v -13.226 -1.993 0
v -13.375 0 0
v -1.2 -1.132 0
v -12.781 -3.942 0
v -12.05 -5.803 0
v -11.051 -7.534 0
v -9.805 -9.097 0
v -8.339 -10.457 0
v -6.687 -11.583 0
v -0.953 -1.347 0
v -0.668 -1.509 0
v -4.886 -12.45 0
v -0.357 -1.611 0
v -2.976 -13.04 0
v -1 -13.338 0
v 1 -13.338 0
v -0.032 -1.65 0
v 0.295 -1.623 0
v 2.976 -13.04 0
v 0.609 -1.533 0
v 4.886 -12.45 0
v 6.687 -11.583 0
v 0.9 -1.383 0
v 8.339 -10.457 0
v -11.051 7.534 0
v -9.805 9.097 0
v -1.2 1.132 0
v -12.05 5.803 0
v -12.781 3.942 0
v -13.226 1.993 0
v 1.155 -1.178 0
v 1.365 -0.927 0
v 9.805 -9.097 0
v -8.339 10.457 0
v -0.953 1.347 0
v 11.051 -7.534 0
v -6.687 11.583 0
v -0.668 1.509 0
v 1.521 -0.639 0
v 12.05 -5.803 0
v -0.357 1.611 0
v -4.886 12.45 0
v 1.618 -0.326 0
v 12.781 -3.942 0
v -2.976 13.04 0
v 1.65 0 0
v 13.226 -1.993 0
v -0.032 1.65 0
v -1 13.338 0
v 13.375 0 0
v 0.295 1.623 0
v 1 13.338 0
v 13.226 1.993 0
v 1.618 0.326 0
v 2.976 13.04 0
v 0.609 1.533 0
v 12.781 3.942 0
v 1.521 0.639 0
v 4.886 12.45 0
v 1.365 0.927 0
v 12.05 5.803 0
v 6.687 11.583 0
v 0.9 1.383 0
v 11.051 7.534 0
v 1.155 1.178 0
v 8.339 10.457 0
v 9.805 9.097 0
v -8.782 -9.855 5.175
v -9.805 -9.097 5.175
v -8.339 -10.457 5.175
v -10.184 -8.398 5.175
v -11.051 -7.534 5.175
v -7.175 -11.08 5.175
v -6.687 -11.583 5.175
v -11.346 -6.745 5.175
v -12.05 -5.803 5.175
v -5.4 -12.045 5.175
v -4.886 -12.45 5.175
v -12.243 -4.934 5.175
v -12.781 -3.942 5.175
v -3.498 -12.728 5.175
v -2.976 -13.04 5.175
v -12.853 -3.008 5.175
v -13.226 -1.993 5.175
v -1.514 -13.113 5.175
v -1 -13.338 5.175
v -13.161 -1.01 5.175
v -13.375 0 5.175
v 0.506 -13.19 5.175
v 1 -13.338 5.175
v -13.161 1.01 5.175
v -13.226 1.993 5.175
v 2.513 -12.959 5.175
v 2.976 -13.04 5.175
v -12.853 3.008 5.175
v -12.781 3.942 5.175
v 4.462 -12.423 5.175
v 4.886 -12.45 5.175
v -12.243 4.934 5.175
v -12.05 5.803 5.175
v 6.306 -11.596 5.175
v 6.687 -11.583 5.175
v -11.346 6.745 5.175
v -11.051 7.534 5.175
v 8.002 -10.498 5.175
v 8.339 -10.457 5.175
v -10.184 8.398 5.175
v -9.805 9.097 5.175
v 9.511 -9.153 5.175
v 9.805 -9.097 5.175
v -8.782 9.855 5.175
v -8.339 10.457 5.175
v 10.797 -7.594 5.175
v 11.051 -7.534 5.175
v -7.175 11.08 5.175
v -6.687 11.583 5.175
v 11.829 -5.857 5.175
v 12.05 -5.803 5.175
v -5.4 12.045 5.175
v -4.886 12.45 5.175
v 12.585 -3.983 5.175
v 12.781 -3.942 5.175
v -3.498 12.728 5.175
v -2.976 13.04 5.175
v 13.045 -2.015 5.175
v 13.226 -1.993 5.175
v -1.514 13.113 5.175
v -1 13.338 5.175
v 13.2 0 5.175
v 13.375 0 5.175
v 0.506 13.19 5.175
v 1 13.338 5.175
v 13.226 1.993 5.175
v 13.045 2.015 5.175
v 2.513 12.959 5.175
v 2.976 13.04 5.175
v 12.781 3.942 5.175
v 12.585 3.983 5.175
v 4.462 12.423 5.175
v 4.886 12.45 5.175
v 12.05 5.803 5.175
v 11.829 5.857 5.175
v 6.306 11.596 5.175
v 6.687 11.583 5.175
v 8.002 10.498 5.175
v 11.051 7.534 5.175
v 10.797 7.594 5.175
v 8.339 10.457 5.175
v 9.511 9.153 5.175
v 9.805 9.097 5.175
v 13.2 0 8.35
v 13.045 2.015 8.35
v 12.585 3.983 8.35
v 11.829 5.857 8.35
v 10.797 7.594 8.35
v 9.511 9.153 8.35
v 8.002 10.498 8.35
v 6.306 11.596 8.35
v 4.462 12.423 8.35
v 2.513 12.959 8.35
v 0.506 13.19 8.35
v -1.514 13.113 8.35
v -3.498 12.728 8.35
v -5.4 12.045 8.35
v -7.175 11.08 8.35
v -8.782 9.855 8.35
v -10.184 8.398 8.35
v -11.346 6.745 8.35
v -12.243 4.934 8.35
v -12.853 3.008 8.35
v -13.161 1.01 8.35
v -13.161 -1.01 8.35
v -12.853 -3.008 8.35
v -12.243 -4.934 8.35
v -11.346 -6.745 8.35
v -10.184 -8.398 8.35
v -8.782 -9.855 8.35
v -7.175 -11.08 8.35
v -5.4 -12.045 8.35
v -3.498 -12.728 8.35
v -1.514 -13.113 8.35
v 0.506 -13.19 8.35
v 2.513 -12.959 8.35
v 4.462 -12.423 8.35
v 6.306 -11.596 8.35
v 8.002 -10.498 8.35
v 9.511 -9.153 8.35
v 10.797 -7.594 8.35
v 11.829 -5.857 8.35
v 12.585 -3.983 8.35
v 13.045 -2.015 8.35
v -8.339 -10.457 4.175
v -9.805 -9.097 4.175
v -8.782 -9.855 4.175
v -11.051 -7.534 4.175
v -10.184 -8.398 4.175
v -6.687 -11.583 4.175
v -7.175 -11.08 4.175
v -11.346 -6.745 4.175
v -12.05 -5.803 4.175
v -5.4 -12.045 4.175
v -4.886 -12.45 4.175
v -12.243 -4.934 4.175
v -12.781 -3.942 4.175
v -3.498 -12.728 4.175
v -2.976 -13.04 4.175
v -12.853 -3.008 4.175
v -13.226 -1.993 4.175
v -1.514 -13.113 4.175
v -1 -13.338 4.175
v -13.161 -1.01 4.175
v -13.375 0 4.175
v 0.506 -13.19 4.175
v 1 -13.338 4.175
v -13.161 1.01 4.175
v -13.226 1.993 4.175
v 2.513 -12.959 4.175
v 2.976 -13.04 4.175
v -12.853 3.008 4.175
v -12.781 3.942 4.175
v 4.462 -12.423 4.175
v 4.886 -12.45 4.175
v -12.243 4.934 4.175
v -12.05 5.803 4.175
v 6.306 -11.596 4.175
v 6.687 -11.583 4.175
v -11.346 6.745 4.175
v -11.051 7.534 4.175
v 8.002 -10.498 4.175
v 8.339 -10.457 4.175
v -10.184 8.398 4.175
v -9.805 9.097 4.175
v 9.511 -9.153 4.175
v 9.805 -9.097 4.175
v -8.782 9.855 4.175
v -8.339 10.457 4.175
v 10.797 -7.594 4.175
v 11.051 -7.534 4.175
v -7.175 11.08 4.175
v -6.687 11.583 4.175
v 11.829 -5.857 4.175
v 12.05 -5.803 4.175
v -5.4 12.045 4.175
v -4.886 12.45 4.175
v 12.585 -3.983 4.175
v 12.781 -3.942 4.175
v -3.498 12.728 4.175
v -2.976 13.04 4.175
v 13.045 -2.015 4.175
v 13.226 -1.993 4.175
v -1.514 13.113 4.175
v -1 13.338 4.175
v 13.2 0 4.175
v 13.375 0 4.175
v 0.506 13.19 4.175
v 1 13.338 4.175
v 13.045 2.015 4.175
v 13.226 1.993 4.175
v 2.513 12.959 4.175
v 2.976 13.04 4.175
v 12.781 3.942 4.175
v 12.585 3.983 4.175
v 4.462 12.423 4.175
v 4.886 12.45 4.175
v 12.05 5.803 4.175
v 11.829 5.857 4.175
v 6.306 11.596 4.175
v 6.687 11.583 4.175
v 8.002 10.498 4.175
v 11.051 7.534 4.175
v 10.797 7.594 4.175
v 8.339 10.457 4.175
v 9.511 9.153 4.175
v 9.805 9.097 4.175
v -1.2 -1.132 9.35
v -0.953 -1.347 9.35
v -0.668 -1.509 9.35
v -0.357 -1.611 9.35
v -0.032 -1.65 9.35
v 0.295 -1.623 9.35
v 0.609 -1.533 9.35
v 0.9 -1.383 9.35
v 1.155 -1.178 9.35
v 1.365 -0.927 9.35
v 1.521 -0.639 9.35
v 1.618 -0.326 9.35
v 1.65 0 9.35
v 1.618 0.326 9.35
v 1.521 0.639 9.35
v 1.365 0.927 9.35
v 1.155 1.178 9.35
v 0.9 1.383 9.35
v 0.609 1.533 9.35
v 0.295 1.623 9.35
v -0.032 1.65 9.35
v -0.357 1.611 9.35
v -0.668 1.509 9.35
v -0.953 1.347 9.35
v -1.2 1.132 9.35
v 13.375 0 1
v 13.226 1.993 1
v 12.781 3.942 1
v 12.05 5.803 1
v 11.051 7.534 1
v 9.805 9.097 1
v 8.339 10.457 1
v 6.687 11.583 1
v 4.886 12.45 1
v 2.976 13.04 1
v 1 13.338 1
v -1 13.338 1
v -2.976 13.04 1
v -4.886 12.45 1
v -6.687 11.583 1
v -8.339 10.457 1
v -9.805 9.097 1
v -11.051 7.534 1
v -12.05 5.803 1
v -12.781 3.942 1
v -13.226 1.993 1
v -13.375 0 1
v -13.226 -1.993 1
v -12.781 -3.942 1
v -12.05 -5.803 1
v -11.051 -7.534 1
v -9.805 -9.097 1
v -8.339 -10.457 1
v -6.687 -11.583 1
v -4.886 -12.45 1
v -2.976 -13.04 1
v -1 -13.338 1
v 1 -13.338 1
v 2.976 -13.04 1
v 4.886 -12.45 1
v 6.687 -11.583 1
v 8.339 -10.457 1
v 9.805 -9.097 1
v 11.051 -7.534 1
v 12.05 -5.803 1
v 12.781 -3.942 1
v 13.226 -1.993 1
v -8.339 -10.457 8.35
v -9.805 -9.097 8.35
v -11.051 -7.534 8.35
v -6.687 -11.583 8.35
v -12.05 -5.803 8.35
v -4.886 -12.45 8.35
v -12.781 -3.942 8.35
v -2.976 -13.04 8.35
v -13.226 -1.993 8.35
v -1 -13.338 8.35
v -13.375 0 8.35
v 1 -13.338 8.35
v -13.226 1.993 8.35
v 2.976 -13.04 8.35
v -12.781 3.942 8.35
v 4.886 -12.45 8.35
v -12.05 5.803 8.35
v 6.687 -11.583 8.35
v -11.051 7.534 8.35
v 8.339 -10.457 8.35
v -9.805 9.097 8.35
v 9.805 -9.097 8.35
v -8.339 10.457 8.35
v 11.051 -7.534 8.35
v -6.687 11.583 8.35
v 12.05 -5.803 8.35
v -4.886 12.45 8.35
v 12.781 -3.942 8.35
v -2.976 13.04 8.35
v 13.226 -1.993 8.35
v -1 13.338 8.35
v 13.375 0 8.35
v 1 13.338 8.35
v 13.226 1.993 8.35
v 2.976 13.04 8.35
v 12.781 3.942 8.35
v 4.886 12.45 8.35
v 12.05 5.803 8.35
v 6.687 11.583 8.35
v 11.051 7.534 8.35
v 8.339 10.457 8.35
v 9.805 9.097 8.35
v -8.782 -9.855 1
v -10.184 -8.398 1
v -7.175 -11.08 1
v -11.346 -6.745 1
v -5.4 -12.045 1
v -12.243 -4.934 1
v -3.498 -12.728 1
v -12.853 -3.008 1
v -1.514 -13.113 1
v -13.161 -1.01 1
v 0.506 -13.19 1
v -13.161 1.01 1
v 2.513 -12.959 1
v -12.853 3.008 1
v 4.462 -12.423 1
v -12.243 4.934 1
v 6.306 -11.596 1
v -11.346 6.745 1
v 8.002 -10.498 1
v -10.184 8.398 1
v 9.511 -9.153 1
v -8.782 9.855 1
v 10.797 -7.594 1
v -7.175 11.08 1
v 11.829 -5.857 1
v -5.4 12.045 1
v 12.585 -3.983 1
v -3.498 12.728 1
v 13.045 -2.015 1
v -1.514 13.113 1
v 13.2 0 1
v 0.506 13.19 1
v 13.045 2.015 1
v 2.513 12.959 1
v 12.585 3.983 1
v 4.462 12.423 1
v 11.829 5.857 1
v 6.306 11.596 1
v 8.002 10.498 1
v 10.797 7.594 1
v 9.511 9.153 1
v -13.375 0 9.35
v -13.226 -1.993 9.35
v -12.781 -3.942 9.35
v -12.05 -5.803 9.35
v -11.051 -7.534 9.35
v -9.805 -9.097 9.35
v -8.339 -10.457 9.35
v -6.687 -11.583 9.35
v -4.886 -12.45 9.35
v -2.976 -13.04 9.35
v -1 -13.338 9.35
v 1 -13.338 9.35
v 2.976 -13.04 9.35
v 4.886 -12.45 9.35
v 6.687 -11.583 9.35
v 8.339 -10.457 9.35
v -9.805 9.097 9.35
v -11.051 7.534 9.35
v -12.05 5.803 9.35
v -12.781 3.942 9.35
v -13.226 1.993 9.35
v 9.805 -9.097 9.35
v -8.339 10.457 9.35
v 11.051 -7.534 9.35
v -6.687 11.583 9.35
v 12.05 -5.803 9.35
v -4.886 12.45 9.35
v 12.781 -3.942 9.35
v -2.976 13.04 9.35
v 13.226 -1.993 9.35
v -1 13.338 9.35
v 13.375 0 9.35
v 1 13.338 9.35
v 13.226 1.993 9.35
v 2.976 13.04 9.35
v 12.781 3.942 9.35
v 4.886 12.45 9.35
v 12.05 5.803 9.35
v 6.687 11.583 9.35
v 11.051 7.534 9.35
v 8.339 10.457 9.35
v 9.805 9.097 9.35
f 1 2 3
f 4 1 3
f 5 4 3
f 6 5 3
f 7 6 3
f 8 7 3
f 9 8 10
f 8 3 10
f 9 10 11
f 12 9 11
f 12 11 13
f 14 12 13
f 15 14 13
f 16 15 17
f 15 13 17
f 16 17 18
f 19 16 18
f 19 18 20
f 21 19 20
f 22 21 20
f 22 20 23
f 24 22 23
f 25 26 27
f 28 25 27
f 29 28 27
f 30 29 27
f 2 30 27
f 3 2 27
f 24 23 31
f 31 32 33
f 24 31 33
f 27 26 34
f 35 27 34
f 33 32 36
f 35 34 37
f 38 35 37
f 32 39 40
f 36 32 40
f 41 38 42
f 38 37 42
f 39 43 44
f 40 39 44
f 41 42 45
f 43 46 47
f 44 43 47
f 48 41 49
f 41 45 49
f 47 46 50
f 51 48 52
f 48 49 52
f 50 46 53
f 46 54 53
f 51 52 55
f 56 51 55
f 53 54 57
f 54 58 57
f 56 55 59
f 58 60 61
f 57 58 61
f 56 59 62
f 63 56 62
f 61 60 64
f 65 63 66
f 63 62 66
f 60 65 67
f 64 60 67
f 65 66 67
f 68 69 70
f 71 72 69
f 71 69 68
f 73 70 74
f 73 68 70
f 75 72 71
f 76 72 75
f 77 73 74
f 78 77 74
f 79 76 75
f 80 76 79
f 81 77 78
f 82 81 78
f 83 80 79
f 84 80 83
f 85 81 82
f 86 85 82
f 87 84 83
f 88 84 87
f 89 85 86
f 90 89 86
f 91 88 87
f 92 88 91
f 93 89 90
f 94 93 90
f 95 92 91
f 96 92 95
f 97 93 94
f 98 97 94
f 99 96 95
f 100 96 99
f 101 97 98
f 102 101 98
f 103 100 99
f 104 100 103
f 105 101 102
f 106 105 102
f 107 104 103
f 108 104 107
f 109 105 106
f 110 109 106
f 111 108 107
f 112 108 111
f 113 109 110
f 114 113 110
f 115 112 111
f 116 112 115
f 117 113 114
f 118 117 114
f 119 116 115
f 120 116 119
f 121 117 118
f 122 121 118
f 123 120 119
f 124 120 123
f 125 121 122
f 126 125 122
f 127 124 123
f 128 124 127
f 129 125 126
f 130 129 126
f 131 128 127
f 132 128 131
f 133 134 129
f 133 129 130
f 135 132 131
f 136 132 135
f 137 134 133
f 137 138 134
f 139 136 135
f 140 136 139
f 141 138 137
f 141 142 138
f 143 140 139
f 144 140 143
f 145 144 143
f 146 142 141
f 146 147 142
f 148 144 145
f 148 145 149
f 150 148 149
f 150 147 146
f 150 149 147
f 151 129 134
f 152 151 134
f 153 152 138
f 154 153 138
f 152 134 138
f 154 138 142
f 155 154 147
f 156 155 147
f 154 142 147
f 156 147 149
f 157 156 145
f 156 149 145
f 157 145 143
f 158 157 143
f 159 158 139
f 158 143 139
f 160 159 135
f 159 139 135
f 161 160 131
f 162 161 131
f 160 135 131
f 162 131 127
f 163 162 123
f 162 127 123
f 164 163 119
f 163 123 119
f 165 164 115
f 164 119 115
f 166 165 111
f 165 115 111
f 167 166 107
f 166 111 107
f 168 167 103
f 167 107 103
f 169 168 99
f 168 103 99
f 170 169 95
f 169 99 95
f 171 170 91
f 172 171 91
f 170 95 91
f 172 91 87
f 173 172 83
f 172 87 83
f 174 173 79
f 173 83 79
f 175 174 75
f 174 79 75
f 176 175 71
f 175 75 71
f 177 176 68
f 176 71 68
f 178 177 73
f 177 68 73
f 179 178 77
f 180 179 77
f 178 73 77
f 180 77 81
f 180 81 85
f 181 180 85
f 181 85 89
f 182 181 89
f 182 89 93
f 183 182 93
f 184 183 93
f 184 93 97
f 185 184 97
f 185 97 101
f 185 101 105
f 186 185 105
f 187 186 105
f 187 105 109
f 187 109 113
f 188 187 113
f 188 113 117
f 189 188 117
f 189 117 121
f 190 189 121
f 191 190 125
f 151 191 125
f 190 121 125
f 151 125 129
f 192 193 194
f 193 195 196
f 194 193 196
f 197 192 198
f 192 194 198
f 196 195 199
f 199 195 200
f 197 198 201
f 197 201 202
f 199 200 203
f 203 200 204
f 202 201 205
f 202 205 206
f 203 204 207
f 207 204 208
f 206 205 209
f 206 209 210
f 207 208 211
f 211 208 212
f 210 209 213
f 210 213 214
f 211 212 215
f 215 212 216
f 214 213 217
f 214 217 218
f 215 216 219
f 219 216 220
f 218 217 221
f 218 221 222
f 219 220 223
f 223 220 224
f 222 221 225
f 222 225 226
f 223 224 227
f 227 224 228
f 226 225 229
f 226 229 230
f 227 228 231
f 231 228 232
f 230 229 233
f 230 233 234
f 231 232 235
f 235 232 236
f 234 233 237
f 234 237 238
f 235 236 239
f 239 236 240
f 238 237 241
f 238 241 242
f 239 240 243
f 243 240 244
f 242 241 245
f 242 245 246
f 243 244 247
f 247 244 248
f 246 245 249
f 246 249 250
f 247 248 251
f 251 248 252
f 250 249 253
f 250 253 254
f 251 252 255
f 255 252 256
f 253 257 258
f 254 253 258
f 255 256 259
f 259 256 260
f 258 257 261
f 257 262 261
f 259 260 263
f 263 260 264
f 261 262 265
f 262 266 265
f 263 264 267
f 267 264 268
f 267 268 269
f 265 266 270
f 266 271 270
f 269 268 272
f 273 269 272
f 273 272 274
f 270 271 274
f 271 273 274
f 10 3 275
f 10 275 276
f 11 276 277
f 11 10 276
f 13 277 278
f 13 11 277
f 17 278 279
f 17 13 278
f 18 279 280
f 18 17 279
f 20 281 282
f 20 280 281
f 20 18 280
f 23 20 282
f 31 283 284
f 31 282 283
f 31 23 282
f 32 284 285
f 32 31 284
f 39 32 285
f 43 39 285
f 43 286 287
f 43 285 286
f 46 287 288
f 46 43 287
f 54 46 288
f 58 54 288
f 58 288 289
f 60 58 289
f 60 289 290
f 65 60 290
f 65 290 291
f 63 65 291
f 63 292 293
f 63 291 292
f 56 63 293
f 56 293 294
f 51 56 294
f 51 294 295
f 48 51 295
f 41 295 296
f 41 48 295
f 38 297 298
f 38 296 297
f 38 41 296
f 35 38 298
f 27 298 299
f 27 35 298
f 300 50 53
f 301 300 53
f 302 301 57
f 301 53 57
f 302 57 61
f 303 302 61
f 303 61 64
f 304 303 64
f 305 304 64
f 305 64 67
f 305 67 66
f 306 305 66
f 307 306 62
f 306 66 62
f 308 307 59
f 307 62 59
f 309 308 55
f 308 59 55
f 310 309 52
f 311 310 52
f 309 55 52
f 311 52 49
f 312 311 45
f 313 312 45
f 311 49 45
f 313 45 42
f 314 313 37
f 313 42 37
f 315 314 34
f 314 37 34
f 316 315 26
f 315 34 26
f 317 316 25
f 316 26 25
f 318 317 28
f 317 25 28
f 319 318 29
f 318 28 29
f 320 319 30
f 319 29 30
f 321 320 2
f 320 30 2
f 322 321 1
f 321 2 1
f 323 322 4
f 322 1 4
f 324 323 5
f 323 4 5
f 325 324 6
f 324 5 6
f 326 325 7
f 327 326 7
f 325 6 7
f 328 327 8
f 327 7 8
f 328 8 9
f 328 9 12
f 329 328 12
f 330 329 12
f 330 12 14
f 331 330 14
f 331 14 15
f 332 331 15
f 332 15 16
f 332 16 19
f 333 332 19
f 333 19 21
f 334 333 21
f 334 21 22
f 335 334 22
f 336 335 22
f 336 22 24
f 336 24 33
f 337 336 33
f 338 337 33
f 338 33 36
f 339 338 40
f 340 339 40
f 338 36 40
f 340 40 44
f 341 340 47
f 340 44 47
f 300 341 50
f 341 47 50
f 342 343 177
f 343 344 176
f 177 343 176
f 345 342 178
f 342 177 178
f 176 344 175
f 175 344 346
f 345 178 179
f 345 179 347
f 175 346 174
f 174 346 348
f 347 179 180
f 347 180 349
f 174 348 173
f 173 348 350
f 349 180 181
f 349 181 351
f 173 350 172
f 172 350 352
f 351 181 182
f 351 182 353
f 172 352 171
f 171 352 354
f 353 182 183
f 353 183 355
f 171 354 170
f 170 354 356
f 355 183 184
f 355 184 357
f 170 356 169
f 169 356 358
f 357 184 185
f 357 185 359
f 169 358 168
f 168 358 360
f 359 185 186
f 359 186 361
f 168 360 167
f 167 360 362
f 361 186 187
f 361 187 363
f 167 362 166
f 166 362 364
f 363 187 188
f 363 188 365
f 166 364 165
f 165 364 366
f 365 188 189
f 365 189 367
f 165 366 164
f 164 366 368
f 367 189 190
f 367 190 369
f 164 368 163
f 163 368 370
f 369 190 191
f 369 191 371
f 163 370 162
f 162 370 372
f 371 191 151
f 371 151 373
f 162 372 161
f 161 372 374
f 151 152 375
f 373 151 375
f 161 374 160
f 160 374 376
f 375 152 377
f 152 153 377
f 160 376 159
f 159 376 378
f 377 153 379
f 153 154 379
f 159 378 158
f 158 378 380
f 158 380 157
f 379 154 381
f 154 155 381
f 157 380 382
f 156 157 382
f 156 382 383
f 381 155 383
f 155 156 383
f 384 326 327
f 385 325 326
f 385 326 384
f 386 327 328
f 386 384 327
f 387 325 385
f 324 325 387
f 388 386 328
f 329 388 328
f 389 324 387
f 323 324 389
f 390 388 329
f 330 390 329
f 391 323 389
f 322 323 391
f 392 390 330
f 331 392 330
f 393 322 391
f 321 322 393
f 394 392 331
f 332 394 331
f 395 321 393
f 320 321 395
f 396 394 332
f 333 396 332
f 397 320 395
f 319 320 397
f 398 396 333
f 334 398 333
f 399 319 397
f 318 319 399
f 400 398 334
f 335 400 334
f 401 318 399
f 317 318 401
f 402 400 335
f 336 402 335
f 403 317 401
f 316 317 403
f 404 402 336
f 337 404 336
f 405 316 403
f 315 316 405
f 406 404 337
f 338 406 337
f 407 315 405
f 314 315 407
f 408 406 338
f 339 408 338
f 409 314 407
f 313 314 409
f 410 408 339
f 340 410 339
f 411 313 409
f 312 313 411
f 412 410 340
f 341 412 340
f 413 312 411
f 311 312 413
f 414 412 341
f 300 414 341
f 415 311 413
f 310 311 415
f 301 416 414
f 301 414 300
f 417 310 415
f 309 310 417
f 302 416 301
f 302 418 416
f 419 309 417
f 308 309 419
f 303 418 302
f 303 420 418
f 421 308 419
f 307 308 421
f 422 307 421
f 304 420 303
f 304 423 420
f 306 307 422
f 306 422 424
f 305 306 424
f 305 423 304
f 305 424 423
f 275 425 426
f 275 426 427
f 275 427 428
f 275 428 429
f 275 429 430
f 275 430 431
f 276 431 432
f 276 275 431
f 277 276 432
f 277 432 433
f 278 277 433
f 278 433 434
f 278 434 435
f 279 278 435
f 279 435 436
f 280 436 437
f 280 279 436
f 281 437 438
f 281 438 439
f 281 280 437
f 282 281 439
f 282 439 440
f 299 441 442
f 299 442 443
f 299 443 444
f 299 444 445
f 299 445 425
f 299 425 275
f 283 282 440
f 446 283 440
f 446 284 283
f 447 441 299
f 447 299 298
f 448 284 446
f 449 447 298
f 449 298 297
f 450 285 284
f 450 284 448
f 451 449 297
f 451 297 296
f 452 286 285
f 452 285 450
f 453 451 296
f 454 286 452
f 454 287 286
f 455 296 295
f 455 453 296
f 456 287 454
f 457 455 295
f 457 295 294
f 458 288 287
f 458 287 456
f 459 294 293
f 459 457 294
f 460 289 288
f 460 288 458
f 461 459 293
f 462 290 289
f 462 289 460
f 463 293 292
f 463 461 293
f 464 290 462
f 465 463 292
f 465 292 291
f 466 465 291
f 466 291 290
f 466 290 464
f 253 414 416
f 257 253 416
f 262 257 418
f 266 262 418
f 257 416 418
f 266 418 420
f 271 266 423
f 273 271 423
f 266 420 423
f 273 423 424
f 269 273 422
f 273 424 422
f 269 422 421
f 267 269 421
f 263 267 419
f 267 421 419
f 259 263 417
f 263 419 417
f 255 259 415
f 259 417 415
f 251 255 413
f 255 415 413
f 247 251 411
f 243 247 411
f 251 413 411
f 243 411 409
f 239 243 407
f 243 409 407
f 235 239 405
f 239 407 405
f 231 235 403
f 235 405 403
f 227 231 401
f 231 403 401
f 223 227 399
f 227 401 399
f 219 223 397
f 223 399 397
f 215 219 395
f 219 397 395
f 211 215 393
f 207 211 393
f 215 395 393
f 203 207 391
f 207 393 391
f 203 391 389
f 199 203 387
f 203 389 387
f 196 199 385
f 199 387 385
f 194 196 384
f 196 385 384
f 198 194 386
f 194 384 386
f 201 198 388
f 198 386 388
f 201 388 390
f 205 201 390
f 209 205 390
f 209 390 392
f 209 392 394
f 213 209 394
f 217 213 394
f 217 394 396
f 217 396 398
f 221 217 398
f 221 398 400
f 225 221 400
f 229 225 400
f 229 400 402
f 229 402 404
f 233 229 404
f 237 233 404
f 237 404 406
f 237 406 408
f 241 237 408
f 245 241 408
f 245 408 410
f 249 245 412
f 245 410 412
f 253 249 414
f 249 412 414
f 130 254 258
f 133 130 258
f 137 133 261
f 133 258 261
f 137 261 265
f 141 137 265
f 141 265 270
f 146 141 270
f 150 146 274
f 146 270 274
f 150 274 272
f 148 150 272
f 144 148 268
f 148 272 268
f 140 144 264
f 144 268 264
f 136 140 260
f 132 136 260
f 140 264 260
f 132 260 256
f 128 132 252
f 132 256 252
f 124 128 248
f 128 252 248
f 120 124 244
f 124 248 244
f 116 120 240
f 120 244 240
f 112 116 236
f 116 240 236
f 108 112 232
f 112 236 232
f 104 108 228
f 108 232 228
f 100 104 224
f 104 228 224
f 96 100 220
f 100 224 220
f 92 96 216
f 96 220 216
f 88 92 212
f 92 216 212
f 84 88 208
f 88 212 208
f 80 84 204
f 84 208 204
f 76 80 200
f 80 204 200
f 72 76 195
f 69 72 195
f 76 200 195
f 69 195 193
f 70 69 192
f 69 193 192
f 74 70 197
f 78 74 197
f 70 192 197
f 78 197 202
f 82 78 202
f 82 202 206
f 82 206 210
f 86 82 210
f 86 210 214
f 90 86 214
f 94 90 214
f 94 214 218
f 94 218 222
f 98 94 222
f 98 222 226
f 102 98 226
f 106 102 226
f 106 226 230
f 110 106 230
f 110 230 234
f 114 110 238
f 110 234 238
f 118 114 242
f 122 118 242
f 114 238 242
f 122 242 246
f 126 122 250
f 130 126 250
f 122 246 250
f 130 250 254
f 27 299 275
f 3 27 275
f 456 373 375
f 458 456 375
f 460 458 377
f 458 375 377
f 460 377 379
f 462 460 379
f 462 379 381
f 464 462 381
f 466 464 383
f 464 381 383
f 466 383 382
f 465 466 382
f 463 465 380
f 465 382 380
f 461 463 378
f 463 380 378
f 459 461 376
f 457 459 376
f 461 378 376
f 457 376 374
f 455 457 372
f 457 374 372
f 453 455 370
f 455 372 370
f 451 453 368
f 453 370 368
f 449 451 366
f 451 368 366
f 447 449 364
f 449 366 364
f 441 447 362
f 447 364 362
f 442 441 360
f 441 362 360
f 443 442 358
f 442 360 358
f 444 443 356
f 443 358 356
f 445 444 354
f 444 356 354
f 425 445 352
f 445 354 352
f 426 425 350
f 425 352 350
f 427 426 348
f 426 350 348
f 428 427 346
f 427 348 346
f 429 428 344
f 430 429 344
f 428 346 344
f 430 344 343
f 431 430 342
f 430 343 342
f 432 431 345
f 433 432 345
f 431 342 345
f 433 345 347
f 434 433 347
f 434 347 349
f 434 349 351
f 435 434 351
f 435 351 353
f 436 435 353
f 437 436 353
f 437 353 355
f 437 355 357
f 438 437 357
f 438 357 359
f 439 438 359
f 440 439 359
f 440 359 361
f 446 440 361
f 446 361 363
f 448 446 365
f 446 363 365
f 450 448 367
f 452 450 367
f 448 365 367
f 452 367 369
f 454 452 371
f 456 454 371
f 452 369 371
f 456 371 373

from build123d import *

# Parameters (mm, degrees)
SKETCH2_R           = 13.375
BOSS_EXTRUDE1_DEPTH = 1
SKETCH3_R           = 13.2
BOSS_EXTRUDE2_DEPTH = 3.175
SKETCH4_R           = 13.375
BOSS_EXTRUDE3_DEPTH = 1
SKETCH5_R           = 13.2
BOSS_EXTRUDE4_DEPTH = 3.175
SKETCH6_R           = 13.375
BOSS_EXTRUDE5_DEPTH = 1
CUT_EXTRUDE2_DEPTH  = 10.35


with BuildPart() as part:
    # Sketch2 → Boss-Extrude1 (new body)
    with BuildSketch(Plane.XY):
        Circle(SKETCH2_R)
    extrude(amount=BOSS_EXTRUDE1_DEPTH)

    # Sketch3 → Boss-Extrude2 (add)
    with BuildSketch(Plane.XY.offset(1)):
        Circle(SKETCH3_R)
    extrude(amount=BOSS_EXTRUDE2_DEPTH)

    # Sketch4 → Boss-Extrude3 (add)
    with BuildSketch(Plane.XY.offset(4.175)):
        Circle(SKETCH4_R)
    extrude(amount=BOSS_EXTRUDE3_DEPTH)

    # Sketch5 → Boss-Extrude4 (add)
    with BuildSketch(Plane.XY.offset(5.175)):
        Circle(SKETCH5_R)
    extrude(amount=BOSS_EXTRUDE4_DEPTH)

    # Sketch6 → Boss-Extrude5 (add)
    with BuildSketch(Plane.XY.offset(8.35)):
        Circle(SKETCH6_R)
    extrude(amount=BOSS_EXTRUDE5_DEPTH)

    # Sketch8 → Cut-Extrude2 (cut, through all)
    with BuildSketch(Plane(origin=(0, 0, 0), x_dir=(-1, 0, 0), z_dir=(0, 0, -1))):
        with BuildLine():
            Line((1.2, 1.132475165), (1.2, -1.132475165))
            ThreePointArc((1.2, -1.132475165), (-1.65, 0), (1.2, 1.132475165))
        make_face()
    extrude(amount=-CUT_EXTRUDE2_DEPTH, mode=Mode.SUBTRACT)


solid = part.part
